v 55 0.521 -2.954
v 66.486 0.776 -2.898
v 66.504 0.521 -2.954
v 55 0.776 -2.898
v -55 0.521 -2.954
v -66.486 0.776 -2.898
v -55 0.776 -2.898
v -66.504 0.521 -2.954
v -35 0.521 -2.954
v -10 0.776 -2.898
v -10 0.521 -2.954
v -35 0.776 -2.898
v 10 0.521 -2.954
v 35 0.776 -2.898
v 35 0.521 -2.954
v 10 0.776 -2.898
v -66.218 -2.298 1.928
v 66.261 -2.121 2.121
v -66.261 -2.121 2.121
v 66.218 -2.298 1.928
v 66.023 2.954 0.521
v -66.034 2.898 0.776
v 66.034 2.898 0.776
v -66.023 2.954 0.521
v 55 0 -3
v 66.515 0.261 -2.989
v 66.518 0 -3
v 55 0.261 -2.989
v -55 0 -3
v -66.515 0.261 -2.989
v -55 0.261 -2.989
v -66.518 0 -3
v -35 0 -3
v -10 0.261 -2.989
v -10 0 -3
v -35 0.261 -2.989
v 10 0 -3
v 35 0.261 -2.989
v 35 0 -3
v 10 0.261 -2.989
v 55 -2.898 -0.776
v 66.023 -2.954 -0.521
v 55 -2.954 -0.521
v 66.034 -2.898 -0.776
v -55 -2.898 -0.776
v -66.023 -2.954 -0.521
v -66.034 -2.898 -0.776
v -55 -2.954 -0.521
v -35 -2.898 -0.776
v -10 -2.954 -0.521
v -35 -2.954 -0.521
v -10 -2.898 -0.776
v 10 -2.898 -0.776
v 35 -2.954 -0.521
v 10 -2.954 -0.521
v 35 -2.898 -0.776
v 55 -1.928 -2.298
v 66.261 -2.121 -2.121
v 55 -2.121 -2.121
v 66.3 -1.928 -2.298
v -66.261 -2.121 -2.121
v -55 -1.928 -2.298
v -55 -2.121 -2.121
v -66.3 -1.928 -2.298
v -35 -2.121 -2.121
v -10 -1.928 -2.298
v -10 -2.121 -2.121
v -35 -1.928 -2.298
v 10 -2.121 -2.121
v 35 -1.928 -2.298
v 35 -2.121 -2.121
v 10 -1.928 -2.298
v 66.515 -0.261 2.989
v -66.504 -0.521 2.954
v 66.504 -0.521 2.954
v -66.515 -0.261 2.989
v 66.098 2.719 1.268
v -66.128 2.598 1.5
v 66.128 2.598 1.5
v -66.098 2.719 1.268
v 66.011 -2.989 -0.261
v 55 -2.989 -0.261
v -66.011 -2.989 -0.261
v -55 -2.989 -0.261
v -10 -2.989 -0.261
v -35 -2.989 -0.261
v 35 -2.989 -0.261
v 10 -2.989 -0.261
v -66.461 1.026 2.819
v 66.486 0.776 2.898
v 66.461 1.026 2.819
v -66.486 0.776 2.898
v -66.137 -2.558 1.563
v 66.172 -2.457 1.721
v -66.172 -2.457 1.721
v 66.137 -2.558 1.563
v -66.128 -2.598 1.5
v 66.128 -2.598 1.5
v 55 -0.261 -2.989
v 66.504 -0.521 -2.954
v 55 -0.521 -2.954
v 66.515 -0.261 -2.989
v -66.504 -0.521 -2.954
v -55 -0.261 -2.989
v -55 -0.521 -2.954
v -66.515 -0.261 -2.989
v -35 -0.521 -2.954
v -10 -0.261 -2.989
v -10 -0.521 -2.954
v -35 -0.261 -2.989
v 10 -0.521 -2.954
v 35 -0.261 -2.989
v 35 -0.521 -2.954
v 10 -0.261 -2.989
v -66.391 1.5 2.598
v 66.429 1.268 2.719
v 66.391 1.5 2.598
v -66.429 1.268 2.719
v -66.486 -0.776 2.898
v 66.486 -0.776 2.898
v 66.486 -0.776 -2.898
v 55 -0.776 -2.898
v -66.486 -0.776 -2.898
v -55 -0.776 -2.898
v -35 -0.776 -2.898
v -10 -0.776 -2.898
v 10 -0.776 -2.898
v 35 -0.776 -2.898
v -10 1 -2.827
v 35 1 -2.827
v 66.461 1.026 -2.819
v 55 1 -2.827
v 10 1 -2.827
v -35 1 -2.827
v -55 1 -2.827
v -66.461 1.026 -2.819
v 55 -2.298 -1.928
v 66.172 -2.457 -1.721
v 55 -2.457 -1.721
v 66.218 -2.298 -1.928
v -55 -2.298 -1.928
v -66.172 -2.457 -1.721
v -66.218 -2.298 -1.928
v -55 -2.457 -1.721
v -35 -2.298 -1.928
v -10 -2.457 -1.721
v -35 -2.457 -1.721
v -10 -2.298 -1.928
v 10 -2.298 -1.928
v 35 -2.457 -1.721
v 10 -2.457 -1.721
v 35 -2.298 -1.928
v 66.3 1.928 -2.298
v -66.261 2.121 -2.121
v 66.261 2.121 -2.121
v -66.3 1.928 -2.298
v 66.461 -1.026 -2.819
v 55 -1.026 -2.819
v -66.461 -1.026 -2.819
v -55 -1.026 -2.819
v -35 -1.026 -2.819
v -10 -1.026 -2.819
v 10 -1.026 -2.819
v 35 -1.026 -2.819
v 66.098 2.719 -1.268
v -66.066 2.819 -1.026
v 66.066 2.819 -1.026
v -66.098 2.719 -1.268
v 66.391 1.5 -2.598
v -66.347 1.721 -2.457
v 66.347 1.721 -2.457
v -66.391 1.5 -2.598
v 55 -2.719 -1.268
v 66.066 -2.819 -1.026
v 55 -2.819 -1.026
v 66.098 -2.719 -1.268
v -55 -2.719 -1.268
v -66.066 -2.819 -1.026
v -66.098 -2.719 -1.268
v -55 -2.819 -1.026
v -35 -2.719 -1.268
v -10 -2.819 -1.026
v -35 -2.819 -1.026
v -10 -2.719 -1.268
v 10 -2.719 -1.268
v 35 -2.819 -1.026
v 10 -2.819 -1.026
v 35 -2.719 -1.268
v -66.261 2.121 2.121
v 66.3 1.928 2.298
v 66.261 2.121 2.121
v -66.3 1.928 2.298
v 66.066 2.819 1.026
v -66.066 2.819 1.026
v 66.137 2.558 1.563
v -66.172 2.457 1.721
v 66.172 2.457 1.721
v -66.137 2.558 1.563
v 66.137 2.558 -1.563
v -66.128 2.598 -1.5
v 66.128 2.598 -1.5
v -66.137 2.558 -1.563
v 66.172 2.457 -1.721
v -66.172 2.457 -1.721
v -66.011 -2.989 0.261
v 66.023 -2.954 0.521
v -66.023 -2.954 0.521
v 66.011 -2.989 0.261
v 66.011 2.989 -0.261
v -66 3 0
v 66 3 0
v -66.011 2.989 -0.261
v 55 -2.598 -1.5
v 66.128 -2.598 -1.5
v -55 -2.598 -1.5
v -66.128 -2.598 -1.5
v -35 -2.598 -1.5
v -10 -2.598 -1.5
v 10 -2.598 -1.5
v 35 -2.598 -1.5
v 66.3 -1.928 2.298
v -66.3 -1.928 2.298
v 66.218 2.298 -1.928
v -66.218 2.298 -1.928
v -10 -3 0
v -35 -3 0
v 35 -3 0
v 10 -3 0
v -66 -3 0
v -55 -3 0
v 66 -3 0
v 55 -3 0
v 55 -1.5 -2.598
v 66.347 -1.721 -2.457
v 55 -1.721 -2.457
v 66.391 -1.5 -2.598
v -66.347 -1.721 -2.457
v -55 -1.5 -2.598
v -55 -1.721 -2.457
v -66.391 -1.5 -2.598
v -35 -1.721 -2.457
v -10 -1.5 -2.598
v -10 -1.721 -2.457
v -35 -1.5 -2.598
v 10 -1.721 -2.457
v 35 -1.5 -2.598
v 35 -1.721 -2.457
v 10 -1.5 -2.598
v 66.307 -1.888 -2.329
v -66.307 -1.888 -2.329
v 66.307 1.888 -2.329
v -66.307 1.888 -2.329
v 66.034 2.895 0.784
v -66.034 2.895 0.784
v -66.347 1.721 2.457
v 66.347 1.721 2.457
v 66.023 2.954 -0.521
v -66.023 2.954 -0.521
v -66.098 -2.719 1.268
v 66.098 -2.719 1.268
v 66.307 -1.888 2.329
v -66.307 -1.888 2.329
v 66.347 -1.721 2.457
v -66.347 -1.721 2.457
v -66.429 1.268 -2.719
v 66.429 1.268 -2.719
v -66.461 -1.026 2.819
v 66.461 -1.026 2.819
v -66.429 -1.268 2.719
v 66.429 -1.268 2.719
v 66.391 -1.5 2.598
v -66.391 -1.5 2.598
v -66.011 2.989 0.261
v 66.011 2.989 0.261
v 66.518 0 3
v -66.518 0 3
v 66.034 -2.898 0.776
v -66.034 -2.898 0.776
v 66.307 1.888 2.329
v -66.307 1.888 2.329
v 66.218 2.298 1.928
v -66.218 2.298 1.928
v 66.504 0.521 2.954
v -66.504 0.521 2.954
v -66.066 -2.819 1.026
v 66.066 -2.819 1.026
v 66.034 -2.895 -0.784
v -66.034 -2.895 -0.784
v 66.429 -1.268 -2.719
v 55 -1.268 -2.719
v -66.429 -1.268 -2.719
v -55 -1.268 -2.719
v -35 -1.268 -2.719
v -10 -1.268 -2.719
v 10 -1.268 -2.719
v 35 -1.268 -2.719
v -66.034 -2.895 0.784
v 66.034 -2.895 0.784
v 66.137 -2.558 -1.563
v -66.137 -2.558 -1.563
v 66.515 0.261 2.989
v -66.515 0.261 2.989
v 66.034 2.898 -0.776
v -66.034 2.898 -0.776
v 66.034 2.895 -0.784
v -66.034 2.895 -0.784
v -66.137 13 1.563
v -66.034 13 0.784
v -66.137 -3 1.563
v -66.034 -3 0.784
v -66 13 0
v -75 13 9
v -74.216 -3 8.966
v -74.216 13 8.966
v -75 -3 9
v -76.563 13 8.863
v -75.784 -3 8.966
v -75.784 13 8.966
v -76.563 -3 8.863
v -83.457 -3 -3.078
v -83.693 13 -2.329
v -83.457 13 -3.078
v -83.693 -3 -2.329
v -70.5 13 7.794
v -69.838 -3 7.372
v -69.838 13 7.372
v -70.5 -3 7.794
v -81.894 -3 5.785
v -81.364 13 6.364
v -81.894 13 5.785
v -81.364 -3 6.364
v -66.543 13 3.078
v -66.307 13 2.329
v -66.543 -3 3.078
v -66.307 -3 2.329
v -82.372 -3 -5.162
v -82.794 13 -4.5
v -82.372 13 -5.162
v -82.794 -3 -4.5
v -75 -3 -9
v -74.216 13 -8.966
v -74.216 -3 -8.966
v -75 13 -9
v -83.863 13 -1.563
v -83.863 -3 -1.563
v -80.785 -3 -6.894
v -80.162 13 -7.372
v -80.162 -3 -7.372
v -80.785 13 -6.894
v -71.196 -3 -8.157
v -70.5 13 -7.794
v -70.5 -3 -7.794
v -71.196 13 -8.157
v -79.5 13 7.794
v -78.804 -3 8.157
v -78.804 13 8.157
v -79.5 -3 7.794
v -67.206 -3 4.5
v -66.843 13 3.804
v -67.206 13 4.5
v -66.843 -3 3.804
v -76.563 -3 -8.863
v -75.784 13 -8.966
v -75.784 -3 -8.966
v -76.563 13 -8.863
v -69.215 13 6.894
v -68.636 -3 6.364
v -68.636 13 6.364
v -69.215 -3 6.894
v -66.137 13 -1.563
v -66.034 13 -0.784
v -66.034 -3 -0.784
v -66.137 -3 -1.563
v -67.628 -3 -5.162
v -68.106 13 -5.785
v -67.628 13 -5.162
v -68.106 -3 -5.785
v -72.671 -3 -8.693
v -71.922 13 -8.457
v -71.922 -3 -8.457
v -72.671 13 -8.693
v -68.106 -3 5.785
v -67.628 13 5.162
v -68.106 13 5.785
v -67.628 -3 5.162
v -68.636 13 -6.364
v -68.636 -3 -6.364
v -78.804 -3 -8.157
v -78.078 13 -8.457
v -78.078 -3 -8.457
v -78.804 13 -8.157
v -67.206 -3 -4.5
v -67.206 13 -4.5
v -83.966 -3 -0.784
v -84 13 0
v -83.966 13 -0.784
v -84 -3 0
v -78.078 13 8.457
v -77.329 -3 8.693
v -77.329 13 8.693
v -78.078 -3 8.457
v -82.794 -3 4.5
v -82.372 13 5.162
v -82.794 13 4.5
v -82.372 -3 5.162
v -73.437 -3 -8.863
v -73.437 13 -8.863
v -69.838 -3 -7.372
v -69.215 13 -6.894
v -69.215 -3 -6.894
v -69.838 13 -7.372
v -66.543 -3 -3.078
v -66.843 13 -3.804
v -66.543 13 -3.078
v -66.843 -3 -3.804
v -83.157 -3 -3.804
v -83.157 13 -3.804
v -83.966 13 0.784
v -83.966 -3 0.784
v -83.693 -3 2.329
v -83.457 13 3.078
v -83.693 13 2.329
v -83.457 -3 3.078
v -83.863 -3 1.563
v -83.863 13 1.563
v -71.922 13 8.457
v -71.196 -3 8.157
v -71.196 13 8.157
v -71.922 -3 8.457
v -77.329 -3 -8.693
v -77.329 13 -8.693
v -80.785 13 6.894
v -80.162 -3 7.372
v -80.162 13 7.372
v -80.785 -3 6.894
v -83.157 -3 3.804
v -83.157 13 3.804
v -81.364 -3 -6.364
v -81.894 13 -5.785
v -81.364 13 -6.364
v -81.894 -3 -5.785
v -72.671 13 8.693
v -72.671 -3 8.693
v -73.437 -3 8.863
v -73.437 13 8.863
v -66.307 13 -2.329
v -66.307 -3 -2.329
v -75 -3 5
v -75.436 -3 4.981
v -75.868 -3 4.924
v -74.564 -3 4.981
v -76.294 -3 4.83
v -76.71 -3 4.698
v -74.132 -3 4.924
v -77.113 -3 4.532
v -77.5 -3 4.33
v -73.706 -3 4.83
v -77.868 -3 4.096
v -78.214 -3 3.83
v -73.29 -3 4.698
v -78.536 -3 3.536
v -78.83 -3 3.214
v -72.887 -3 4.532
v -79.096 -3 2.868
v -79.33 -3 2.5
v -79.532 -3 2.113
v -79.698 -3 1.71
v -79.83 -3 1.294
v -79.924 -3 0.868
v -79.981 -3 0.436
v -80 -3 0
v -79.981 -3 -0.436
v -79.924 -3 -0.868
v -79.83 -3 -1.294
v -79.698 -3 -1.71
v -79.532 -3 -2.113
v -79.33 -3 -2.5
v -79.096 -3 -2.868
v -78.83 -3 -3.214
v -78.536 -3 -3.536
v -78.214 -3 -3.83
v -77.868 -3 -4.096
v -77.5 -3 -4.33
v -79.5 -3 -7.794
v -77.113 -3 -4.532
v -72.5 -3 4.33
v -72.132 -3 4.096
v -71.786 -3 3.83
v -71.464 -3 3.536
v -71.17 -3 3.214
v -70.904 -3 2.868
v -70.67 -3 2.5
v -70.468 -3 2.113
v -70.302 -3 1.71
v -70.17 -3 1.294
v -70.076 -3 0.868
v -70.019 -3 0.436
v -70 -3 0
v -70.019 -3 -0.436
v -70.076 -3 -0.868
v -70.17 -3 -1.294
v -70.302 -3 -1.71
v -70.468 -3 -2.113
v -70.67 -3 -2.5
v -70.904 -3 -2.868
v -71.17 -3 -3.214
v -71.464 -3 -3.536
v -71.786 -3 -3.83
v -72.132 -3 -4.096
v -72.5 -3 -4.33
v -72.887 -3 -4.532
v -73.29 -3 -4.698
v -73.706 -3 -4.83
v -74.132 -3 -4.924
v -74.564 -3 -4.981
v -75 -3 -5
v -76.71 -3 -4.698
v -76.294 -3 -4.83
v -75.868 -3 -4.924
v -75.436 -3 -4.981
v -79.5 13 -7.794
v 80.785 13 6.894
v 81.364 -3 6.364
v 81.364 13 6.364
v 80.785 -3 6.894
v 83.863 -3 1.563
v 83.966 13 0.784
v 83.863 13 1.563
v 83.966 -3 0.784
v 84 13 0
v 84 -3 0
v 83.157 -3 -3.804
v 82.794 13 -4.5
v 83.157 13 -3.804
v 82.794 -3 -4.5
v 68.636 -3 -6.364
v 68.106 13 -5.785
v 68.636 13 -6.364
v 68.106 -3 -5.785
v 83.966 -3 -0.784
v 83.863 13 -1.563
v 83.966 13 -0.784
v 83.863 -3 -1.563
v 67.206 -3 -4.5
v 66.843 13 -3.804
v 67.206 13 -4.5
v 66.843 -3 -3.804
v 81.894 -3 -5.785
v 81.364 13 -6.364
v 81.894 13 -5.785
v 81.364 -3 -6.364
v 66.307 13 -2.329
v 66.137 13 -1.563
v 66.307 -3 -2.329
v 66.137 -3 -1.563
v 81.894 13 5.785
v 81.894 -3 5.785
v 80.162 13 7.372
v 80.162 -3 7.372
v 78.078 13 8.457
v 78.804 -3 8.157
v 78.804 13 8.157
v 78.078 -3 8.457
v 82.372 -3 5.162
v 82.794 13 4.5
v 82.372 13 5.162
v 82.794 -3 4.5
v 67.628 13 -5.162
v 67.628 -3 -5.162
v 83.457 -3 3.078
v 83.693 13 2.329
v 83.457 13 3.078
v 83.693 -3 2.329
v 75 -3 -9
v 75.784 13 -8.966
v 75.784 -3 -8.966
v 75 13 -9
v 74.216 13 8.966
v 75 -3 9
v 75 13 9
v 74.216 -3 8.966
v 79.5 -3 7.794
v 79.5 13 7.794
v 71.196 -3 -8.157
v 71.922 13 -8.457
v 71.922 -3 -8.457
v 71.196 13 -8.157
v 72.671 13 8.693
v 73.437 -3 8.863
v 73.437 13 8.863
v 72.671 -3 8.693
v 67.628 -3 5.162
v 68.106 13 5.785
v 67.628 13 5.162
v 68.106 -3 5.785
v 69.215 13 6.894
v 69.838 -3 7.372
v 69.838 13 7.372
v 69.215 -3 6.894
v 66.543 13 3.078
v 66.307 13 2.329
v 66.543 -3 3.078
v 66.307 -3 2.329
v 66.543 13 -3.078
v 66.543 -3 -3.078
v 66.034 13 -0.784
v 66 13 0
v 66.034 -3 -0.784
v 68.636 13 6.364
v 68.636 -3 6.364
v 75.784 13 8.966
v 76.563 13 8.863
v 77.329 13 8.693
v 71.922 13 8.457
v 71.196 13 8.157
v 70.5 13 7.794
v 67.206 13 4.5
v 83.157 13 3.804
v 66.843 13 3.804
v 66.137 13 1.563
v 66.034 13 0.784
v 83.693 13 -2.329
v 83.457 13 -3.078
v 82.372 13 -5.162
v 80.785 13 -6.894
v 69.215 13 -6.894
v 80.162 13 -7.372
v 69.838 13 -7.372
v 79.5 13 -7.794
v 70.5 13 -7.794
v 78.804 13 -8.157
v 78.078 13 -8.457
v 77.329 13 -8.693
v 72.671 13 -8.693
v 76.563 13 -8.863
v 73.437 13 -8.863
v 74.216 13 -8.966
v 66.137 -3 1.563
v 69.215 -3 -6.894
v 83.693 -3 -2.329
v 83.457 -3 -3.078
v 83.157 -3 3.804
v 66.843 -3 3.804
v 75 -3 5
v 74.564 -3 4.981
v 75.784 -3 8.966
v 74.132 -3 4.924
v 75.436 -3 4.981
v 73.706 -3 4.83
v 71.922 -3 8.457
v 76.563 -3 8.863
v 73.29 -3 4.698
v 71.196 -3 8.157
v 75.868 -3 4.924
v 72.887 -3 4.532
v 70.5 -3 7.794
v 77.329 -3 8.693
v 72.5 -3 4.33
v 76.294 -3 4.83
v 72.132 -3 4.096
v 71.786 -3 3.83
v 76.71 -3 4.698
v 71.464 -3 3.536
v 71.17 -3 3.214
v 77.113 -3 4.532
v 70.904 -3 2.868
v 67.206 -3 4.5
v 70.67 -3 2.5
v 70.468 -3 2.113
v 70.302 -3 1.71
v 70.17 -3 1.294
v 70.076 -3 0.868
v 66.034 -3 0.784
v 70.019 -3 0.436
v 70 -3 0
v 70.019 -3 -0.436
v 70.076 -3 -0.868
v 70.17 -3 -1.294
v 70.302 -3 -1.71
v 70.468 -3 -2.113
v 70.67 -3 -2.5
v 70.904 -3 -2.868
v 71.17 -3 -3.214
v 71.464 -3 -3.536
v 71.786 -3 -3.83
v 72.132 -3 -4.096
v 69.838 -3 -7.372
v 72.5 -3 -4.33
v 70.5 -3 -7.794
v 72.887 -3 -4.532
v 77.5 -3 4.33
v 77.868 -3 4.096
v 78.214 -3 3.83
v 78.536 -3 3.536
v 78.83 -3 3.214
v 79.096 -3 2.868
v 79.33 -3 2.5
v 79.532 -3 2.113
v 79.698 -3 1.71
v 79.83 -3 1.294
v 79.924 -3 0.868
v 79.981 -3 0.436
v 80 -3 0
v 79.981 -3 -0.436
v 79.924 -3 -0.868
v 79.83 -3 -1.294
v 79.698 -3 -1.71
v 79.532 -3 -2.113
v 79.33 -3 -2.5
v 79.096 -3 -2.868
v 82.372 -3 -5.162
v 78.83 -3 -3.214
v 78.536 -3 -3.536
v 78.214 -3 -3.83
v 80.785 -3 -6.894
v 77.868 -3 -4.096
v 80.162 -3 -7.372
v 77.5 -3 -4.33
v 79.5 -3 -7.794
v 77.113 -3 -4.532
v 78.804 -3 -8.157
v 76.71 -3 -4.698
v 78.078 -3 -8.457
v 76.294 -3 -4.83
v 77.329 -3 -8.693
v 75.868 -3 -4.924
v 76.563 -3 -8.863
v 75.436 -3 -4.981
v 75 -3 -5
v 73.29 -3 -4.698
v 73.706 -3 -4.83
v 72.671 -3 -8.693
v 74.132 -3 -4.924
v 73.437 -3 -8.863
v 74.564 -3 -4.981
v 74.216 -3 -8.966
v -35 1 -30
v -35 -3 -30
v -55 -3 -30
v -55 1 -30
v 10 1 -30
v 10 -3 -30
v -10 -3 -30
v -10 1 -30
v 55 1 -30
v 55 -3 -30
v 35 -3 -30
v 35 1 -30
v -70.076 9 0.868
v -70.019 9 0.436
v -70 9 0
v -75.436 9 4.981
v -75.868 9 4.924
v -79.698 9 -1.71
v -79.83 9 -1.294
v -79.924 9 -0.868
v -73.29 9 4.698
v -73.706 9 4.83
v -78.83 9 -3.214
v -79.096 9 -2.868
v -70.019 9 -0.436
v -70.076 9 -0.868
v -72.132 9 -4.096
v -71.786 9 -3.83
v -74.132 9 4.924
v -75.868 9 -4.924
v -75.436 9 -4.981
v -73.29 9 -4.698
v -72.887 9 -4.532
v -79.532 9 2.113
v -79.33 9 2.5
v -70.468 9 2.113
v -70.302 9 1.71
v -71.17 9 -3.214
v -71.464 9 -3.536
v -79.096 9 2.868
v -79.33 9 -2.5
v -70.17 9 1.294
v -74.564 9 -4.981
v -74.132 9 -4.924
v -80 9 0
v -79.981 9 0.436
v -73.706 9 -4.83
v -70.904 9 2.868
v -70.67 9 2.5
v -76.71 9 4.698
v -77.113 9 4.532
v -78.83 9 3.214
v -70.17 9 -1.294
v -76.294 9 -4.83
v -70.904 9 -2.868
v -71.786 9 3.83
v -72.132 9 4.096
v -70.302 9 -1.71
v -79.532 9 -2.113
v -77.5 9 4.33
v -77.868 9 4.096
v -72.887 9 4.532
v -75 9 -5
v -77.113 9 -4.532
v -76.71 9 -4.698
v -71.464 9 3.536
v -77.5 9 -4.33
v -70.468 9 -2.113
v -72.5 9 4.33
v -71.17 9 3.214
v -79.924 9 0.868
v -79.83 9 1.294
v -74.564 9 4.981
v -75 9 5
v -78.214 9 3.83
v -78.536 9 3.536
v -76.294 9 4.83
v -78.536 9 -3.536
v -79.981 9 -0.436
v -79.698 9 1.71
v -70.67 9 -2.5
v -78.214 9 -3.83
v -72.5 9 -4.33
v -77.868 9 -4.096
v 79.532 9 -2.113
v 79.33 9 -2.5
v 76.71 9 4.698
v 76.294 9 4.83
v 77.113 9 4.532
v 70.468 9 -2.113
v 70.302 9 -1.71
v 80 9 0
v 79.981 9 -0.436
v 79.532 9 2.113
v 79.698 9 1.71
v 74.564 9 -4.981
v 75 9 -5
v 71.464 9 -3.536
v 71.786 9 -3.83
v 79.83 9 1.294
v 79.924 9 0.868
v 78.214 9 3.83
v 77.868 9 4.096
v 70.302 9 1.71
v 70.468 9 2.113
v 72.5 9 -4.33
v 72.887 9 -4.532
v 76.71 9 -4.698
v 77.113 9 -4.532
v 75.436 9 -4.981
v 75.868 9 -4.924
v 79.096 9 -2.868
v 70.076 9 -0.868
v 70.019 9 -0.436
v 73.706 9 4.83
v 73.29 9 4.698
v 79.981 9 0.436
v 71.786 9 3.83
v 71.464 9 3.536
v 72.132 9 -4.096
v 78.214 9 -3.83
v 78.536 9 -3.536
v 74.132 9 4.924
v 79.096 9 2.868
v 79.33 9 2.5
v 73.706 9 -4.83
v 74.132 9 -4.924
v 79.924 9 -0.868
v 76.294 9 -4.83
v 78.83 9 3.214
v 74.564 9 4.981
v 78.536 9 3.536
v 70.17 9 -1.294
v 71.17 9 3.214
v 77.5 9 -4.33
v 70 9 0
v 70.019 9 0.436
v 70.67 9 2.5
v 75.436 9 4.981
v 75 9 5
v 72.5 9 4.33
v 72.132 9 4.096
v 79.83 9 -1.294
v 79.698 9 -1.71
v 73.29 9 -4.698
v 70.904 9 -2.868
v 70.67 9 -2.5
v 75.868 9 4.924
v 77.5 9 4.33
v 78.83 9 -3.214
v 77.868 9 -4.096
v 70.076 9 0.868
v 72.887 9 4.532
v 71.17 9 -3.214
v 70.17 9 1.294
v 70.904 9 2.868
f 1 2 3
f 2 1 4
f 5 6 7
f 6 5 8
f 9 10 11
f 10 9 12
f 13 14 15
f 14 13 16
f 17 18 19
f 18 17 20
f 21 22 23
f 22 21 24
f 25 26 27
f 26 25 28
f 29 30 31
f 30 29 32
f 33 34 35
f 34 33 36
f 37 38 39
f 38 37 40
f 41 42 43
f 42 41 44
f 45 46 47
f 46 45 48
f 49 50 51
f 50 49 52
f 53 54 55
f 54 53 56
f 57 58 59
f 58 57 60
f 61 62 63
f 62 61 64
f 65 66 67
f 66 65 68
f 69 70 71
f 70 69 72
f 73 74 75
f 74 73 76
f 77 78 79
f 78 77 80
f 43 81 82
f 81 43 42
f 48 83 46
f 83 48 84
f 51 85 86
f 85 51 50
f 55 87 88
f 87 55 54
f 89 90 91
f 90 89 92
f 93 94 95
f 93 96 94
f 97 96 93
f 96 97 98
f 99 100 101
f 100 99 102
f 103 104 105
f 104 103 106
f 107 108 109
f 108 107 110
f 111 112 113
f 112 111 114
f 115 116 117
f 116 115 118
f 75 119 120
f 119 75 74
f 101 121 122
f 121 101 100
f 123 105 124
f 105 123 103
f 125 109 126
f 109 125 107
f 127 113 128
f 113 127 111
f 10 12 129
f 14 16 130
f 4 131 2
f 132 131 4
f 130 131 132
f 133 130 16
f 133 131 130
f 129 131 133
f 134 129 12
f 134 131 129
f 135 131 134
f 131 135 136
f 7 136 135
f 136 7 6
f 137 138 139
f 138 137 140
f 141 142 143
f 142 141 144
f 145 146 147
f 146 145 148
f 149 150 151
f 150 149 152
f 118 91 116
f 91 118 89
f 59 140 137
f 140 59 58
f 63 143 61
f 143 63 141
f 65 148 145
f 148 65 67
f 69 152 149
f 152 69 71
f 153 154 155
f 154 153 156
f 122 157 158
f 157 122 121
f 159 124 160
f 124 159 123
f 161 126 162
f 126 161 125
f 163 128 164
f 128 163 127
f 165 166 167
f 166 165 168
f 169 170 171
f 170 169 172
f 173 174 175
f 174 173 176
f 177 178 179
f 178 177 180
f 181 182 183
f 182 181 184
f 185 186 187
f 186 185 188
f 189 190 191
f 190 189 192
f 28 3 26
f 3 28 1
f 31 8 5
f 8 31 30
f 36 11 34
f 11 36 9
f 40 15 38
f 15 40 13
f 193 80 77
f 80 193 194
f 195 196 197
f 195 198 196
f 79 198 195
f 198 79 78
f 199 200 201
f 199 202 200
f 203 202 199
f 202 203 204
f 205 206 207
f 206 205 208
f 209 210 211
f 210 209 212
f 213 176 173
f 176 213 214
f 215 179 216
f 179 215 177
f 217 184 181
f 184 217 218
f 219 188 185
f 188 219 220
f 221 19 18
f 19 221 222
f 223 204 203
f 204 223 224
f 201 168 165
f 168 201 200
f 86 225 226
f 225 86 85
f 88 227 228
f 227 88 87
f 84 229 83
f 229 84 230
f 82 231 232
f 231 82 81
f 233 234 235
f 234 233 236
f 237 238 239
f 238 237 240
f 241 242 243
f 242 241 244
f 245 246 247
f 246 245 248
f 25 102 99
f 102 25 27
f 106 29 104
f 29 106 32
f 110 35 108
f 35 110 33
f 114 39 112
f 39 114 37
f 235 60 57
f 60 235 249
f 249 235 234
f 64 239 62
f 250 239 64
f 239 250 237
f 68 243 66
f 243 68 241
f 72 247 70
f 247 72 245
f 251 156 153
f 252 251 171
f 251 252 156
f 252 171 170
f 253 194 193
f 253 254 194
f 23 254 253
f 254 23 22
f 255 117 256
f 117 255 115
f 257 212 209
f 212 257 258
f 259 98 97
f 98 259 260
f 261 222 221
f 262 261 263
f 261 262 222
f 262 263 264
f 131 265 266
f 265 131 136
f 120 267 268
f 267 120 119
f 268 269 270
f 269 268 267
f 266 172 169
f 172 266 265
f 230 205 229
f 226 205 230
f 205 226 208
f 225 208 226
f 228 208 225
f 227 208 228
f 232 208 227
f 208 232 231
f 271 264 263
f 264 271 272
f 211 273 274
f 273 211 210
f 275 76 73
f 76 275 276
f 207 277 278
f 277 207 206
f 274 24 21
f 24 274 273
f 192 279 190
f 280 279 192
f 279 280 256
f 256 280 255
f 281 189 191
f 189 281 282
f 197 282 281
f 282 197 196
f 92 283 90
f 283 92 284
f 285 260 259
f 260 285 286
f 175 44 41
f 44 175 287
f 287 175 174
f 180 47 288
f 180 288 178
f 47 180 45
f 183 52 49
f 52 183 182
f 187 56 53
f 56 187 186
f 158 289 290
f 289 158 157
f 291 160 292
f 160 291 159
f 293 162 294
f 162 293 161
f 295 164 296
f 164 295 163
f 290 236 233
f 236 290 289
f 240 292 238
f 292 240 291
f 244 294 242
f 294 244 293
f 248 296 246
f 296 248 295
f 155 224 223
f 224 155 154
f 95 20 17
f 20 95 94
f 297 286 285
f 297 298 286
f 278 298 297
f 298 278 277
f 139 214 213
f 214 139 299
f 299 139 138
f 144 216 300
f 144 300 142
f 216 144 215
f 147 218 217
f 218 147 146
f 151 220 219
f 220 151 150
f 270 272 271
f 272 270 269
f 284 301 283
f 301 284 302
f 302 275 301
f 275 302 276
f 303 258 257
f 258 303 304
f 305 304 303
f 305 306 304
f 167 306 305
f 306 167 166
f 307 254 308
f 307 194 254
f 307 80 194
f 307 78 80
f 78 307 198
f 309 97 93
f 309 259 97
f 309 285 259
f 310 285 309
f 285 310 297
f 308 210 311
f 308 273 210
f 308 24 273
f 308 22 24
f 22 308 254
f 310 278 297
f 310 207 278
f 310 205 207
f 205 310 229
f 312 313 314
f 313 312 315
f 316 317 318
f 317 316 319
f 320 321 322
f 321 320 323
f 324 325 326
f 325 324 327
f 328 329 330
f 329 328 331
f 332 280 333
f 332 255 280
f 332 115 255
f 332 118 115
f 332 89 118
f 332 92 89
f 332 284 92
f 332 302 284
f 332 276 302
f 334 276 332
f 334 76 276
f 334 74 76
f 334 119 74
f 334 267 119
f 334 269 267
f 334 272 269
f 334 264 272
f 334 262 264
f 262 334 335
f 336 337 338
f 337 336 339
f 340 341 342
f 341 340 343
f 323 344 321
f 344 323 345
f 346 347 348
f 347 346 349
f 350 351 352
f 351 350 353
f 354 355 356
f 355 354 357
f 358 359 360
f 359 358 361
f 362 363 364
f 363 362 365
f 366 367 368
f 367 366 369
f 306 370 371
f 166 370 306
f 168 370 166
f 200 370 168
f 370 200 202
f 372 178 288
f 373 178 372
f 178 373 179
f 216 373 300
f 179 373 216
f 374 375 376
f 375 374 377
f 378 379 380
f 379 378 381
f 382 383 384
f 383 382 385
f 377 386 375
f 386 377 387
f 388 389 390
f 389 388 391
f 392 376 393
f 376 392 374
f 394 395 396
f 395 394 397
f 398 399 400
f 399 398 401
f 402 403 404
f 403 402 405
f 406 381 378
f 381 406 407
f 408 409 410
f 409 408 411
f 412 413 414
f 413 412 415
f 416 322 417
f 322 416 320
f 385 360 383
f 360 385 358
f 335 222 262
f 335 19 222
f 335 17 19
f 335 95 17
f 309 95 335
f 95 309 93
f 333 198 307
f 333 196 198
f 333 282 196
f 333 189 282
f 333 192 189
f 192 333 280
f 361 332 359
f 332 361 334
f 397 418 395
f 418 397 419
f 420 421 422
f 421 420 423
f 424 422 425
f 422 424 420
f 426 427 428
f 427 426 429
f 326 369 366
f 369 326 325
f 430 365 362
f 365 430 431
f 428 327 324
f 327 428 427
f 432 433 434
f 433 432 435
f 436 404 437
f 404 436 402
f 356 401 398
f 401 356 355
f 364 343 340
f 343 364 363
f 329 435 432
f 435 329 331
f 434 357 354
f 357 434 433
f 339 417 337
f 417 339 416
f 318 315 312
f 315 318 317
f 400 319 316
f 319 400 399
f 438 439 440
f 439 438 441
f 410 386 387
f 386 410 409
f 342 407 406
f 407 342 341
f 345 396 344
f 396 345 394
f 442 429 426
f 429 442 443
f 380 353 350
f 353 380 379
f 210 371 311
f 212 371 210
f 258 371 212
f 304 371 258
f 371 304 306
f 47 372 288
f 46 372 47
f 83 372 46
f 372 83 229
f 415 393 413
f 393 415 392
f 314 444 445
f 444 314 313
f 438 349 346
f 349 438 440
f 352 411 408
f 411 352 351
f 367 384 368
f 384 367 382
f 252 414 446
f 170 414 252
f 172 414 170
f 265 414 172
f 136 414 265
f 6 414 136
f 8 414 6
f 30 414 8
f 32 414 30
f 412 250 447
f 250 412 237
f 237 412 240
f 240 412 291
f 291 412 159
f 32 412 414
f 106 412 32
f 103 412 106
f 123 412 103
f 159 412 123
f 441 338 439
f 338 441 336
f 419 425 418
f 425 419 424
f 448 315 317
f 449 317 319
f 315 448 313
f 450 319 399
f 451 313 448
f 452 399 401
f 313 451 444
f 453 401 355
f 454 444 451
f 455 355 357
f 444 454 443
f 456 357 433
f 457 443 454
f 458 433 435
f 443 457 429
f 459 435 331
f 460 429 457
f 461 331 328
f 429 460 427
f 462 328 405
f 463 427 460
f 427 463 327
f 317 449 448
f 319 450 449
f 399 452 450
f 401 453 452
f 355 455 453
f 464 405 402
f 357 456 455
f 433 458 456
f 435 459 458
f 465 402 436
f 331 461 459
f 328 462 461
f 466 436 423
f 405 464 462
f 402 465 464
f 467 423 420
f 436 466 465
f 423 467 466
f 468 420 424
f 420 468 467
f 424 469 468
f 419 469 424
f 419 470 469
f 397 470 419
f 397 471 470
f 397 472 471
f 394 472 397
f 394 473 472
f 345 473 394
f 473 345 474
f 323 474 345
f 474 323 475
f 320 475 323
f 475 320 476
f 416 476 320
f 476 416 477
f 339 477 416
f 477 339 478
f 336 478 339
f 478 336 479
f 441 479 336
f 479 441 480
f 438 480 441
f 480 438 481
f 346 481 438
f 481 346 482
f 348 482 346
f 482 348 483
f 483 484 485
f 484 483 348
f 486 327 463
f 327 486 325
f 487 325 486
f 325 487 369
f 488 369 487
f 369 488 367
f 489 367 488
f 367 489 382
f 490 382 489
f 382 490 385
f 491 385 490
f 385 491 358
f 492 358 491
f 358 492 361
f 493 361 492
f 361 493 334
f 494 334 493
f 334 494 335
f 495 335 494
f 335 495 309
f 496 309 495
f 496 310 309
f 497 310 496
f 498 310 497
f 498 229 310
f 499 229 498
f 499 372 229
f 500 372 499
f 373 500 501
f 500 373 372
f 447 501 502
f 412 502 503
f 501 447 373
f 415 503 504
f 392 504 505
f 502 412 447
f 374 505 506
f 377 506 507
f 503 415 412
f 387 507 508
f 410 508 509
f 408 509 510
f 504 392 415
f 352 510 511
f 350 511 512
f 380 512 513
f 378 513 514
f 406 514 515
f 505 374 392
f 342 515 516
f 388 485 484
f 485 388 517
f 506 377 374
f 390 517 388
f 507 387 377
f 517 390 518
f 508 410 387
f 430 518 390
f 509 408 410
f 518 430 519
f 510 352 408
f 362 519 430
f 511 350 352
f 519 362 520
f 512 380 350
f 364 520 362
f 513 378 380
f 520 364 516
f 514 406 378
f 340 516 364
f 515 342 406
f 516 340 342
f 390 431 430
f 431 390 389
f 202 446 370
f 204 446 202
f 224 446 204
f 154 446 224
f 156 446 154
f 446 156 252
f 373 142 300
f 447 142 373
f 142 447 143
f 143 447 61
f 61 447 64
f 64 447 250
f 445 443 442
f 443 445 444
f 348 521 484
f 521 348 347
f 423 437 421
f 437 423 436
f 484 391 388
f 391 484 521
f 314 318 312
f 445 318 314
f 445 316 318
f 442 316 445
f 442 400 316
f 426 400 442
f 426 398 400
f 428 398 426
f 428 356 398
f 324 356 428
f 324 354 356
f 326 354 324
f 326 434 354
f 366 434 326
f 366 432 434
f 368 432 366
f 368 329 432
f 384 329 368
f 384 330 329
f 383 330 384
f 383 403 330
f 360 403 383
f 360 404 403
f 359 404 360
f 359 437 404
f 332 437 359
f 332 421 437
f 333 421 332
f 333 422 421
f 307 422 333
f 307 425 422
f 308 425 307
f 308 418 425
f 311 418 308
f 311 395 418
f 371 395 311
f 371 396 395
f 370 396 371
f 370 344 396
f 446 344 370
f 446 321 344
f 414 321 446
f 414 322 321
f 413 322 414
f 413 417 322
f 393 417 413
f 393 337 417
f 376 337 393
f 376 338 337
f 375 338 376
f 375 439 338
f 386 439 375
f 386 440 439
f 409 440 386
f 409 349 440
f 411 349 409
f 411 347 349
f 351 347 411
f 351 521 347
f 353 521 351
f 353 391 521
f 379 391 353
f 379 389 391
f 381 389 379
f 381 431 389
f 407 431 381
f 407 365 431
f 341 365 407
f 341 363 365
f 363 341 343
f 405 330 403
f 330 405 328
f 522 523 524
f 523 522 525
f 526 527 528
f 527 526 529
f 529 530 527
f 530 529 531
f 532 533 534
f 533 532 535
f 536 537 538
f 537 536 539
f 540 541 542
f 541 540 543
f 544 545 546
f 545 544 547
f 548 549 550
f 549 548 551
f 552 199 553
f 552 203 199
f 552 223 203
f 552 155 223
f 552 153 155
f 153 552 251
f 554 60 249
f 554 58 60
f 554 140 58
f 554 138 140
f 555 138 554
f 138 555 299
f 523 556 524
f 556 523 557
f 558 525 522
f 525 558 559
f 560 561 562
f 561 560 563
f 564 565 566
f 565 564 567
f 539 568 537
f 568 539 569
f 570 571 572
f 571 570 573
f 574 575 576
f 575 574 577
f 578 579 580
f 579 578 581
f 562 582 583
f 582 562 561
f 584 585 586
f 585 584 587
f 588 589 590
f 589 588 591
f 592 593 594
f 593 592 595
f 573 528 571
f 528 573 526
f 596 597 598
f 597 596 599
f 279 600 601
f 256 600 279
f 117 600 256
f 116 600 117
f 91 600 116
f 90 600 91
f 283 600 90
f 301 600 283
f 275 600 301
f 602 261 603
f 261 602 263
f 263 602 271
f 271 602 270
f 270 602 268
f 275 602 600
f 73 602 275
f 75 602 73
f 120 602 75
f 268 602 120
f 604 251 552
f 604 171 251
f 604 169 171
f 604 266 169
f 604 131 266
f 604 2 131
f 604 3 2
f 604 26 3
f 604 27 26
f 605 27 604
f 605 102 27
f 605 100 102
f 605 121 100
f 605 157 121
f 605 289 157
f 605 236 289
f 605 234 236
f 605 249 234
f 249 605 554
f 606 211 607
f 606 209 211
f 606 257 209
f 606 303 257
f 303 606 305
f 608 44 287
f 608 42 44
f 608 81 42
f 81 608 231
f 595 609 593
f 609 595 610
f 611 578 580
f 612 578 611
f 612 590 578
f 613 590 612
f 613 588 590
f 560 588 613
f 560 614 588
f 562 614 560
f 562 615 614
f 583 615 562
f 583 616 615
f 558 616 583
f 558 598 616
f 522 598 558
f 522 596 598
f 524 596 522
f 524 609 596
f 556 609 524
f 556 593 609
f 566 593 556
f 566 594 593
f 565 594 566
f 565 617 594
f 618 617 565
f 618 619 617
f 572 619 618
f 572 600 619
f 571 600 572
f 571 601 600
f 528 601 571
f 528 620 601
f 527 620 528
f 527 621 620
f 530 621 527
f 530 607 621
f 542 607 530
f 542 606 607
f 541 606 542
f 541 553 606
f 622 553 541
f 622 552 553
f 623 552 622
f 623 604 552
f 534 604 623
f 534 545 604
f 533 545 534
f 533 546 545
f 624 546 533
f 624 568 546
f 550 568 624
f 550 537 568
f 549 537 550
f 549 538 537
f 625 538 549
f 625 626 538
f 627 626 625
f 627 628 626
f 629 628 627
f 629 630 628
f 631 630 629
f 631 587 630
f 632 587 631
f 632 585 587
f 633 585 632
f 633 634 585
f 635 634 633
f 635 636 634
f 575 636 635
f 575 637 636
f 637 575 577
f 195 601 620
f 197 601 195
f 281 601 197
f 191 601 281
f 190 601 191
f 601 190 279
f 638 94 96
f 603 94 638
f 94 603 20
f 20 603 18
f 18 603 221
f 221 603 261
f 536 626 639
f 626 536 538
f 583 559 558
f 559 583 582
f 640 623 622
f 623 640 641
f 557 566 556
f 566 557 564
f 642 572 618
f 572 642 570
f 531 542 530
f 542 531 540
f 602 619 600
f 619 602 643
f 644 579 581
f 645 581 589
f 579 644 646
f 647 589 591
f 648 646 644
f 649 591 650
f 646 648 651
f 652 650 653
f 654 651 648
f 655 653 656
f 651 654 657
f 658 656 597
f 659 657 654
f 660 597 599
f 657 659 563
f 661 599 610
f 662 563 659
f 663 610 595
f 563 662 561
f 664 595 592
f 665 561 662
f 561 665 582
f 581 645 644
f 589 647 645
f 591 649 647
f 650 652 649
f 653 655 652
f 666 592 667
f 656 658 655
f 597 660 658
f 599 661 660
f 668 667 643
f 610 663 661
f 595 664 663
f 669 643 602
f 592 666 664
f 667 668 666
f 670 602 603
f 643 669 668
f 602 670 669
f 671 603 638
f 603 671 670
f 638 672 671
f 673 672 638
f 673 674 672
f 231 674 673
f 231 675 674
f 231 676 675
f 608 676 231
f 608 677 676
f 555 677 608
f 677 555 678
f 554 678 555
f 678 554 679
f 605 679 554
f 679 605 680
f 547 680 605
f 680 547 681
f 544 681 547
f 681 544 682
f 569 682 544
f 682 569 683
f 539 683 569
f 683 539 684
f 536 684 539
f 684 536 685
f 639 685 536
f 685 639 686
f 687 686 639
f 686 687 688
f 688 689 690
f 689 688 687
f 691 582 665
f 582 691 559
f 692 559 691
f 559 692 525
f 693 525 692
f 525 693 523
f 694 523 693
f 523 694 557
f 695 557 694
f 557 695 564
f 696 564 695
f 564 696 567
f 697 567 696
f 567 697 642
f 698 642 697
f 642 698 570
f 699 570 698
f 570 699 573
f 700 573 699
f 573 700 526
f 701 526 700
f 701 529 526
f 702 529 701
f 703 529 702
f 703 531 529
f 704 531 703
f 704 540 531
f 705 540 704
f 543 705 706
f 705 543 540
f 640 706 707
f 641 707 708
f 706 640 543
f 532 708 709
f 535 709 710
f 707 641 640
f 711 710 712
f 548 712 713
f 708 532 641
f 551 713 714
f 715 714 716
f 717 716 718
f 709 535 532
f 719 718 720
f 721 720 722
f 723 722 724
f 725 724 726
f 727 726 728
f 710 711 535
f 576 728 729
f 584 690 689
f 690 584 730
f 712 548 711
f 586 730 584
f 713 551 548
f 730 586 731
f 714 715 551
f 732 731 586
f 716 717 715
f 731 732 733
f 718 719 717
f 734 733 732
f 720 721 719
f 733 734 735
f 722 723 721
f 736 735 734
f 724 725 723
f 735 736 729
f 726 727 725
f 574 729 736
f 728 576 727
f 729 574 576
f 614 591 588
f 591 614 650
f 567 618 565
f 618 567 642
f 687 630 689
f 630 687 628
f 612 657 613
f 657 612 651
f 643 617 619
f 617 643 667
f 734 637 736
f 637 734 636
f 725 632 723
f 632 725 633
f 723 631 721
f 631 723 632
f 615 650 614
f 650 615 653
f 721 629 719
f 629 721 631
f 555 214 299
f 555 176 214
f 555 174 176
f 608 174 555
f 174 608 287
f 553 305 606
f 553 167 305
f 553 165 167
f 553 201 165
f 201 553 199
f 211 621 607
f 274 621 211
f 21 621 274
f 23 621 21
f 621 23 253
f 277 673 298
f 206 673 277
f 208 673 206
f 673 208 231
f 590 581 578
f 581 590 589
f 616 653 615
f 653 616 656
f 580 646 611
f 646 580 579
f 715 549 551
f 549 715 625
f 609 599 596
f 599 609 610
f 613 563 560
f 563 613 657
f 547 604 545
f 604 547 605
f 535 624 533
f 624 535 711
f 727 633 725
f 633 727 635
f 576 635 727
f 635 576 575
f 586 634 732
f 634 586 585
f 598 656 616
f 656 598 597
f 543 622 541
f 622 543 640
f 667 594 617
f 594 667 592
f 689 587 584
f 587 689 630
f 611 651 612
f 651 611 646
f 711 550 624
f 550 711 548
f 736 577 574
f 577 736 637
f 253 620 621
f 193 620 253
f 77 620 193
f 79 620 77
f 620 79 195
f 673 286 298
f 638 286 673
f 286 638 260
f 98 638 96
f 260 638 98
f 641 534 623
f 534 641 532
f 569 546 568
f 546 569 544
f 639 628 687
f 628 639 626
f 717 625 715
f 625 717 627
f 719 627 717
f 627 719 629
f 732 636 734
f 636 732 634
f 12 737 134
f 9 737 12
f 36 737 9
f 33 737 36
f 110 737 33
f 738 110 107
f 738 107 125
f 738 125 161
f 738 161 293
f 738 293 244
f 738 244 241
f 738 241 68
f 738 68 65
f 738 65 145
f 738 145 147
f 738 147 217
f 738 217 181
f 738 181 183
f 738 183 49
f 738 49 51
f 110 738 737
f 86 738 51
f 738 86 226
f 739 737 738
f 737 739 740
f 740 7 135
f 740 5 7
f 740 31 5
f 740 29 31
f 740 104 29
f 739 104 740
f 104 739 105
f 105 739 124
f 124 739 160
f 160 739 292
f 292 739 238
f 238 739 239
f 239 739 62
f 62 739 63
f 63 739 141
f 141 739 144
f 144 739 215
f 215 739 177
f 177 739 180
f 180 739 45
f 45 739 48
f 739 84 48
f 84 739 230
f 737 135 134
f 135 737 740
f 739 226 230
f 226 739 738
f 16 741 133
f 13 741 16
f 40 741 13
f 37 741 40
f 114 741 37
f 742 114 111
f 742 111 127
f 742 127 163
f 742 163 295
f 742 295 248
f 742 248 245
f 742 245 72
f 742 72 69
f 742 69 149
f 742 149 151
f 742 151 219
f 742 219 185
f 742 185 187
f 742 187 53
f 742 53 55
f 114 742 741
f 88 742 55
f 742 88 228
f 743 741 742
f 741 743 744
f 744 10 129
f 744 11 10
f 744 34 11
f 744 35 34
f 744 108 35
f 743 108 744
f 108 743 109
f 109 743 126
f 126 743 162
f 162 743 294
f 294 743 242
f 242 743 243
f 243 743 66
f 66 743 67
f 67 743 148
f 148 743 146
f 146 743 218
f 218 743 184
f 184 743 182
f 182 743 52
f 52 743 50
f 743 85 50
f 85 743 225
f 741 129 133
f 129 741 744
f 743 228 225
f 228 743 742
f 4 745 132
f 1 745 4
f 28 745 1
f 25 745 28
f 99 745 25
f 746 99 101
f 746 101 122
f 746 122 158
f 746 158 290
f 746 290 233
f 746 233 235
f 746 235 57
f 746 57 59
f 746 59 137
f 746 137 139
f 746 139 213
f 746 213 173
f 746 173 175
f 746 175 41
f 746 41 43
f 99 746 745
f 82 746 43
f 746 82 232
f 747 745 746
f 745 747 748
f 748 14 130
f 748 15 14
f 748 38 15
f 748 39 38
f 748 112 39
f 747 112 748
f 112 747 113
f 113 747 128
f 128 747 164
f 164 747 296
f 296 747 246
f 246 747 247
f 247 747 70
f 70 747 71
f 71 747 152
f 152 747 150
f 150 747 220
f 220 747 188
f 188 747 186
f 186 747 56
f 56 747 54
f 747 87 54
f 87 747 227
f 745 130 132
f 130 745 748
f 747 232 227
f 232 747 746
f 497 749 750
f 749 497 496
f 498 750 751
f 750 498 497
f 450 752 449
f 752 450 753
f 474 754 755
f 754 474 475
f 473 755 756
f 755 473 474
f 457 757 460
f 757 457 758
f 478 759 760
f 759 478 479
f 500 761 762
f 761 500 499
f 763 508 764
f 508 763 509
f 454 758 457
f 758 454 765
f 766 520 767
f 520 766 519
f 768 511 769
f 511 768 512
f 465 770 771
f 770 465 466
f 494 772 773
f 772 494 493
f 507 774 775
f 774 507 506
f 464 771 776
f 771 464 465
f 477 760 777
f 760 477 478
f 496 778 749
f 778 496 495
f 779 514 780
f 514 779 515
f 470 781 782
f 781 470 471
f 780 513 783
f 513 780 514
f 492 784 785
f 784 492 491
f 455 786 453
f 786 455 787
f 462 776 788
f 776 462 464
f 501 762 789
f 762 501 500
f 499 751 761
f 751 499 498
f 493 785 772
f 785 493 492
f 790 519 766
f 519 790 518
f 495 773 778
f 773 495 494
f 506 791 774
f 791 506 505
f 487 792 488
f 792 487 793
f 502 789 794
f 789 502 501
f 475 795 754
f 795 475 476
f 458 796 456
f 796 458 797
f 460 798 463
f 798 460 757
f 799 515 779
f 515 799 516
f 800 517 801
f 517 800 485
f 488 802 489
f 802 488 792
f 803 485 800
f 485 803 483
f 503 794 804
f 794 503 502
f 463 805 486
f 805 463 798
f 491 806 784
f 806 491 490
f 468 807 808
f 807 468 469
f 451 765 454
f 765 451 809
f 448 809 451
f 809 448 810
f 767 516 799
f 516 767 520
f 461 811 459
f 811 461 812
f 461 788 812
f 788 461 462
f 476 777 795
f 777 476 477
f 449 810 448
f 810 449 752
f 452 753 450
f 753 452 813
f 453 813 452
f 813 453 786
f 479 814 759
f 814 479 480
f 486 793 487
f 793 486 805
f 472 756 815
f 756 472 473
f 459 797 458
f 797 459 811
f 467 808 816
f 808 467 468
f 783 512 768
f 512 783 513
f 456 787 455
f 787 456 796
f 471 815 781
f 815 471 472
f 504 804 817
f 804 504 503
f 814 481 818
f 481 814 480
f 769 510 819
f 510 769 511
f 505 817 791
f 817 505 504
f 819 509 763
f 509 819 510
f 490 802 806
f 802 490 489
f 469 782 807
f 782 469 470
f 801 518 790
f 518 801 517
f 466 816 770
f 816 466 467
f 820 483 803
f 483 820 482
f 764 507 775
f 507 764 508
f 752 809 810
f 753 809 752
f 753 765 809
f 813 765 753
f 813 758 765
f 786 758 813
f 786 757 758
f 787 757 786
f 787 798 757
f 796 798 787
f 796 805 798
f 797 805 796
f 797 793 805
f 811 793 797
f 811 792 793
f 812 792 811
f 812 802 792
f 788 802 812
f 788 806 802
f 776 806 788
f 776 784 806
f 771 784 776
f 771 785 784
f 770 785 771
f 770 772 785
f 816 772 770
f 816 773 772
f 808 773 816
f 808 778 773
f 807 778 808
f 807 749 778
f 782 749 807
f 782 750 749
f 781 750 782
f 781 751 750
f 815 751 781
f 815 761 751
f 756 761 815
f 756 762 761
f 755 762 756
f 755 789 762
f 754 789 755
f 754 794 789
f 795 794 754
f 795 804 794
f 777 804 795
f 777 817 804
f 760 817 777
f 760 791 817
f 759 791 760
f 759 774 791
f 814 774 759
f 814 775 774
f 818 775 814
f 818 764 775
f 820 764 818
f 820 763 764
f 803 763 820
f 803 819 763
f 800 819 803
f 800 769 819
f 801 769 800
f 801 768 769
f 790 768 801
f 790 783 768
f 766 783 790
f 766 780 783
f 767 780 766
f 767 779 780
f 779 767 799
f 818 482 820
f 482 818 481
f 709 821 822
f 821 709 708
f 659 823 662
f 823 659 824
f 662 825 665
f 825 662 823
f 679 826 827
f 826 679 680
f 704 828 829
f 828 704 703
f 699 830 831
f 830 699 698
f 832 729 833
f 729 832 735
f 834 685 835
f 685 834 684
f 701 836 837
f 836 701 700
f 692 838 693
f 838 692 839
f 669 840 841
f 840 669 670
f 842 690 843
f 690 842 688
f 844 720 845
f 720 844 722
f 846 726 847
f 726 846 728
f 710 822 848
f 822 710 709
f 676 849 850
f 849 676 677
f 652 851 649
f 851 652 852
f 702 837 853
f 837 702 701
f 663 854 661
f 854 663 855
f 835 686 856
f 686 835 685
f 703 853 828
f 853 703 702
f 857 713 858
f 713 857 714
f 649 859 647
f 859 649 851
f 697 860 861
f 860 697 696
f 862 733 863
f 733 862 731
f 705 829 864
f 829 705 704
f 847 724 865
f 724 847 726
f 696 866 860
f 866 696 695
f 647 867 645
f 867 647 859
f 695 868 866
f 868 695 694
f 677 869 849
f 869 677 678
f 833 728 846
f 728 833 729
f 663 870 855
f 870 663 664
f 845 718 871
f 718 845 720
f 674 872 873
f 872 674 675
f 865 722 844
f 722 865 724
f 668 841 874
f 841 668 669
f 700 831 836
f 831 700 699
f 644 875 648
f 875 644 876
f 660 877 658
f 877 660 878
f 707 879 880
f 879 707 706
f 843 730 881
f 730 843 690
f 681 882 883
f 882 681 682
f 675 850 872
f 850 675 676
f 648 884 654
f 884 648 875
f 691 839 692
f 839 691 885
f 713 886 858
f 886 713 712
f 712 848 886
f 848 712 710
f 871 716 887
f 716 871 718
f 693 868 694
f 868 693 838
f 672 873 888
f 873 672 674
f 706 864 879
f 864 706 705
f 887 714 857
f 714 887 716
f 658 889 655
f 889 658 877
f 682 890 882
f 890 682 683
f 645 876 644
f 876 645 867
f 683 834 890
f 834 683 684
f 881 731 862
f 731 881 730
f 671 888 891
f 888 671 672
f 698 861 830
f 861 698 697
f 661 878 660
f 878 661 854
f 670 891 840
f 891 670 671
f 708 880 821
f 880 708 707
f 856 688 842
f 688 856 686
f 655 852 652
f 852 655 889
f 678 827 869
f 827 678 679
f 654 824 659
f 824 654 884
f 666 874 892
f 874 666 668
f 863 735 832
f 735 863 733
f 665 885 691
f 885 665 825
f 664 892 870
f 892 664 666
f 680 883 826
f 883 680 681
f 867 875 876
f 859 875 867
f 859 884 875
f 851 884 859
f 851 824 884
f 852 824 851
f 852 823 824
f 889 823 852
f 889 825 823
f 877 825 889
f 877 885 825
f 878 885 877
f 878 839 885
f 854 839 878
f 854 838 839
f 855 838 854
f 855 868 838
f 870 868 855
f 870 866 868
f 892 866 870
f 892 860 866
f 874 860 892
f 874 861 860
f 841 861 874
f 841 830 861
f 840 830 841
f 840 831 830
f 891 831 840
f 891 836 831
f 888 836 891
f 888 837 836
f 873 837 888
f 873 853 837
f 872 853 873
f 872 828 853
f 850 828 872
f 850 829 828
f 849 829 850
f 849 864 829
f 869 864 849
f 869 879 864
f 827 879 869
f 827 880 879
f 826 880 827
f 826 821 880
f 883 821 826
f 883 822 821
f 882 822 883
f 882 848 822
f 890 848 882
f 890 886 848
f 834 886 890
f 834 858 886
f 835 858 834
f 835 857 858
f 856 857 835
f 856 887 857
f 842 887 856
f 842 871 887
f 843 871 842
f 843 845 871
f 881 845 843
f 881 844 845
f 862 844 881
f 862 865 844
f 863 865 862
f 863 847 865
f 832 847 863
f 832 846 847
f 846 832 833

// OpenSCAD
$fa=5; $fs=0.1;

difference(){
	union(){
		rotate([0,90,0]) cylinder(r=3, h=150, center=true); //поперечина
		translate([-75, 5, 0]) rotate([90,0,0]) cylinder(h=16, r=9, center=true); // бобышки крепления
		translate([75, 5, 0]) rotate([90,0,0]) cylinder(h=16, r=9, center=true);
		
		translate([-75+20, -3, -30]) cube ([20, 4, 30]); // упоры кормух
		translate([-10, -3, -30]) cube ([20, 4, 30]);
		translate([75-20-20, -3, -30]) cube ([20, 4, 30]);
	}

	union(){
		translate([-75, 1, 0]) rotate([90,0,0]) cylinder(h=16, r=5, center=true); // под бобышки крепления
		translate([75, 1, 0]) rotate([90,0,0]) cylinder(h=16, r=5, center=true);
		translate([-75, 1, 0]) rotate([90,0,0]) cylinder(h=16, r=5, center=true); // под винты
		translate([75, 1, 0]) rotate([90,0,0]) cylinder(h=16, r=5, center=true);
	}
}
